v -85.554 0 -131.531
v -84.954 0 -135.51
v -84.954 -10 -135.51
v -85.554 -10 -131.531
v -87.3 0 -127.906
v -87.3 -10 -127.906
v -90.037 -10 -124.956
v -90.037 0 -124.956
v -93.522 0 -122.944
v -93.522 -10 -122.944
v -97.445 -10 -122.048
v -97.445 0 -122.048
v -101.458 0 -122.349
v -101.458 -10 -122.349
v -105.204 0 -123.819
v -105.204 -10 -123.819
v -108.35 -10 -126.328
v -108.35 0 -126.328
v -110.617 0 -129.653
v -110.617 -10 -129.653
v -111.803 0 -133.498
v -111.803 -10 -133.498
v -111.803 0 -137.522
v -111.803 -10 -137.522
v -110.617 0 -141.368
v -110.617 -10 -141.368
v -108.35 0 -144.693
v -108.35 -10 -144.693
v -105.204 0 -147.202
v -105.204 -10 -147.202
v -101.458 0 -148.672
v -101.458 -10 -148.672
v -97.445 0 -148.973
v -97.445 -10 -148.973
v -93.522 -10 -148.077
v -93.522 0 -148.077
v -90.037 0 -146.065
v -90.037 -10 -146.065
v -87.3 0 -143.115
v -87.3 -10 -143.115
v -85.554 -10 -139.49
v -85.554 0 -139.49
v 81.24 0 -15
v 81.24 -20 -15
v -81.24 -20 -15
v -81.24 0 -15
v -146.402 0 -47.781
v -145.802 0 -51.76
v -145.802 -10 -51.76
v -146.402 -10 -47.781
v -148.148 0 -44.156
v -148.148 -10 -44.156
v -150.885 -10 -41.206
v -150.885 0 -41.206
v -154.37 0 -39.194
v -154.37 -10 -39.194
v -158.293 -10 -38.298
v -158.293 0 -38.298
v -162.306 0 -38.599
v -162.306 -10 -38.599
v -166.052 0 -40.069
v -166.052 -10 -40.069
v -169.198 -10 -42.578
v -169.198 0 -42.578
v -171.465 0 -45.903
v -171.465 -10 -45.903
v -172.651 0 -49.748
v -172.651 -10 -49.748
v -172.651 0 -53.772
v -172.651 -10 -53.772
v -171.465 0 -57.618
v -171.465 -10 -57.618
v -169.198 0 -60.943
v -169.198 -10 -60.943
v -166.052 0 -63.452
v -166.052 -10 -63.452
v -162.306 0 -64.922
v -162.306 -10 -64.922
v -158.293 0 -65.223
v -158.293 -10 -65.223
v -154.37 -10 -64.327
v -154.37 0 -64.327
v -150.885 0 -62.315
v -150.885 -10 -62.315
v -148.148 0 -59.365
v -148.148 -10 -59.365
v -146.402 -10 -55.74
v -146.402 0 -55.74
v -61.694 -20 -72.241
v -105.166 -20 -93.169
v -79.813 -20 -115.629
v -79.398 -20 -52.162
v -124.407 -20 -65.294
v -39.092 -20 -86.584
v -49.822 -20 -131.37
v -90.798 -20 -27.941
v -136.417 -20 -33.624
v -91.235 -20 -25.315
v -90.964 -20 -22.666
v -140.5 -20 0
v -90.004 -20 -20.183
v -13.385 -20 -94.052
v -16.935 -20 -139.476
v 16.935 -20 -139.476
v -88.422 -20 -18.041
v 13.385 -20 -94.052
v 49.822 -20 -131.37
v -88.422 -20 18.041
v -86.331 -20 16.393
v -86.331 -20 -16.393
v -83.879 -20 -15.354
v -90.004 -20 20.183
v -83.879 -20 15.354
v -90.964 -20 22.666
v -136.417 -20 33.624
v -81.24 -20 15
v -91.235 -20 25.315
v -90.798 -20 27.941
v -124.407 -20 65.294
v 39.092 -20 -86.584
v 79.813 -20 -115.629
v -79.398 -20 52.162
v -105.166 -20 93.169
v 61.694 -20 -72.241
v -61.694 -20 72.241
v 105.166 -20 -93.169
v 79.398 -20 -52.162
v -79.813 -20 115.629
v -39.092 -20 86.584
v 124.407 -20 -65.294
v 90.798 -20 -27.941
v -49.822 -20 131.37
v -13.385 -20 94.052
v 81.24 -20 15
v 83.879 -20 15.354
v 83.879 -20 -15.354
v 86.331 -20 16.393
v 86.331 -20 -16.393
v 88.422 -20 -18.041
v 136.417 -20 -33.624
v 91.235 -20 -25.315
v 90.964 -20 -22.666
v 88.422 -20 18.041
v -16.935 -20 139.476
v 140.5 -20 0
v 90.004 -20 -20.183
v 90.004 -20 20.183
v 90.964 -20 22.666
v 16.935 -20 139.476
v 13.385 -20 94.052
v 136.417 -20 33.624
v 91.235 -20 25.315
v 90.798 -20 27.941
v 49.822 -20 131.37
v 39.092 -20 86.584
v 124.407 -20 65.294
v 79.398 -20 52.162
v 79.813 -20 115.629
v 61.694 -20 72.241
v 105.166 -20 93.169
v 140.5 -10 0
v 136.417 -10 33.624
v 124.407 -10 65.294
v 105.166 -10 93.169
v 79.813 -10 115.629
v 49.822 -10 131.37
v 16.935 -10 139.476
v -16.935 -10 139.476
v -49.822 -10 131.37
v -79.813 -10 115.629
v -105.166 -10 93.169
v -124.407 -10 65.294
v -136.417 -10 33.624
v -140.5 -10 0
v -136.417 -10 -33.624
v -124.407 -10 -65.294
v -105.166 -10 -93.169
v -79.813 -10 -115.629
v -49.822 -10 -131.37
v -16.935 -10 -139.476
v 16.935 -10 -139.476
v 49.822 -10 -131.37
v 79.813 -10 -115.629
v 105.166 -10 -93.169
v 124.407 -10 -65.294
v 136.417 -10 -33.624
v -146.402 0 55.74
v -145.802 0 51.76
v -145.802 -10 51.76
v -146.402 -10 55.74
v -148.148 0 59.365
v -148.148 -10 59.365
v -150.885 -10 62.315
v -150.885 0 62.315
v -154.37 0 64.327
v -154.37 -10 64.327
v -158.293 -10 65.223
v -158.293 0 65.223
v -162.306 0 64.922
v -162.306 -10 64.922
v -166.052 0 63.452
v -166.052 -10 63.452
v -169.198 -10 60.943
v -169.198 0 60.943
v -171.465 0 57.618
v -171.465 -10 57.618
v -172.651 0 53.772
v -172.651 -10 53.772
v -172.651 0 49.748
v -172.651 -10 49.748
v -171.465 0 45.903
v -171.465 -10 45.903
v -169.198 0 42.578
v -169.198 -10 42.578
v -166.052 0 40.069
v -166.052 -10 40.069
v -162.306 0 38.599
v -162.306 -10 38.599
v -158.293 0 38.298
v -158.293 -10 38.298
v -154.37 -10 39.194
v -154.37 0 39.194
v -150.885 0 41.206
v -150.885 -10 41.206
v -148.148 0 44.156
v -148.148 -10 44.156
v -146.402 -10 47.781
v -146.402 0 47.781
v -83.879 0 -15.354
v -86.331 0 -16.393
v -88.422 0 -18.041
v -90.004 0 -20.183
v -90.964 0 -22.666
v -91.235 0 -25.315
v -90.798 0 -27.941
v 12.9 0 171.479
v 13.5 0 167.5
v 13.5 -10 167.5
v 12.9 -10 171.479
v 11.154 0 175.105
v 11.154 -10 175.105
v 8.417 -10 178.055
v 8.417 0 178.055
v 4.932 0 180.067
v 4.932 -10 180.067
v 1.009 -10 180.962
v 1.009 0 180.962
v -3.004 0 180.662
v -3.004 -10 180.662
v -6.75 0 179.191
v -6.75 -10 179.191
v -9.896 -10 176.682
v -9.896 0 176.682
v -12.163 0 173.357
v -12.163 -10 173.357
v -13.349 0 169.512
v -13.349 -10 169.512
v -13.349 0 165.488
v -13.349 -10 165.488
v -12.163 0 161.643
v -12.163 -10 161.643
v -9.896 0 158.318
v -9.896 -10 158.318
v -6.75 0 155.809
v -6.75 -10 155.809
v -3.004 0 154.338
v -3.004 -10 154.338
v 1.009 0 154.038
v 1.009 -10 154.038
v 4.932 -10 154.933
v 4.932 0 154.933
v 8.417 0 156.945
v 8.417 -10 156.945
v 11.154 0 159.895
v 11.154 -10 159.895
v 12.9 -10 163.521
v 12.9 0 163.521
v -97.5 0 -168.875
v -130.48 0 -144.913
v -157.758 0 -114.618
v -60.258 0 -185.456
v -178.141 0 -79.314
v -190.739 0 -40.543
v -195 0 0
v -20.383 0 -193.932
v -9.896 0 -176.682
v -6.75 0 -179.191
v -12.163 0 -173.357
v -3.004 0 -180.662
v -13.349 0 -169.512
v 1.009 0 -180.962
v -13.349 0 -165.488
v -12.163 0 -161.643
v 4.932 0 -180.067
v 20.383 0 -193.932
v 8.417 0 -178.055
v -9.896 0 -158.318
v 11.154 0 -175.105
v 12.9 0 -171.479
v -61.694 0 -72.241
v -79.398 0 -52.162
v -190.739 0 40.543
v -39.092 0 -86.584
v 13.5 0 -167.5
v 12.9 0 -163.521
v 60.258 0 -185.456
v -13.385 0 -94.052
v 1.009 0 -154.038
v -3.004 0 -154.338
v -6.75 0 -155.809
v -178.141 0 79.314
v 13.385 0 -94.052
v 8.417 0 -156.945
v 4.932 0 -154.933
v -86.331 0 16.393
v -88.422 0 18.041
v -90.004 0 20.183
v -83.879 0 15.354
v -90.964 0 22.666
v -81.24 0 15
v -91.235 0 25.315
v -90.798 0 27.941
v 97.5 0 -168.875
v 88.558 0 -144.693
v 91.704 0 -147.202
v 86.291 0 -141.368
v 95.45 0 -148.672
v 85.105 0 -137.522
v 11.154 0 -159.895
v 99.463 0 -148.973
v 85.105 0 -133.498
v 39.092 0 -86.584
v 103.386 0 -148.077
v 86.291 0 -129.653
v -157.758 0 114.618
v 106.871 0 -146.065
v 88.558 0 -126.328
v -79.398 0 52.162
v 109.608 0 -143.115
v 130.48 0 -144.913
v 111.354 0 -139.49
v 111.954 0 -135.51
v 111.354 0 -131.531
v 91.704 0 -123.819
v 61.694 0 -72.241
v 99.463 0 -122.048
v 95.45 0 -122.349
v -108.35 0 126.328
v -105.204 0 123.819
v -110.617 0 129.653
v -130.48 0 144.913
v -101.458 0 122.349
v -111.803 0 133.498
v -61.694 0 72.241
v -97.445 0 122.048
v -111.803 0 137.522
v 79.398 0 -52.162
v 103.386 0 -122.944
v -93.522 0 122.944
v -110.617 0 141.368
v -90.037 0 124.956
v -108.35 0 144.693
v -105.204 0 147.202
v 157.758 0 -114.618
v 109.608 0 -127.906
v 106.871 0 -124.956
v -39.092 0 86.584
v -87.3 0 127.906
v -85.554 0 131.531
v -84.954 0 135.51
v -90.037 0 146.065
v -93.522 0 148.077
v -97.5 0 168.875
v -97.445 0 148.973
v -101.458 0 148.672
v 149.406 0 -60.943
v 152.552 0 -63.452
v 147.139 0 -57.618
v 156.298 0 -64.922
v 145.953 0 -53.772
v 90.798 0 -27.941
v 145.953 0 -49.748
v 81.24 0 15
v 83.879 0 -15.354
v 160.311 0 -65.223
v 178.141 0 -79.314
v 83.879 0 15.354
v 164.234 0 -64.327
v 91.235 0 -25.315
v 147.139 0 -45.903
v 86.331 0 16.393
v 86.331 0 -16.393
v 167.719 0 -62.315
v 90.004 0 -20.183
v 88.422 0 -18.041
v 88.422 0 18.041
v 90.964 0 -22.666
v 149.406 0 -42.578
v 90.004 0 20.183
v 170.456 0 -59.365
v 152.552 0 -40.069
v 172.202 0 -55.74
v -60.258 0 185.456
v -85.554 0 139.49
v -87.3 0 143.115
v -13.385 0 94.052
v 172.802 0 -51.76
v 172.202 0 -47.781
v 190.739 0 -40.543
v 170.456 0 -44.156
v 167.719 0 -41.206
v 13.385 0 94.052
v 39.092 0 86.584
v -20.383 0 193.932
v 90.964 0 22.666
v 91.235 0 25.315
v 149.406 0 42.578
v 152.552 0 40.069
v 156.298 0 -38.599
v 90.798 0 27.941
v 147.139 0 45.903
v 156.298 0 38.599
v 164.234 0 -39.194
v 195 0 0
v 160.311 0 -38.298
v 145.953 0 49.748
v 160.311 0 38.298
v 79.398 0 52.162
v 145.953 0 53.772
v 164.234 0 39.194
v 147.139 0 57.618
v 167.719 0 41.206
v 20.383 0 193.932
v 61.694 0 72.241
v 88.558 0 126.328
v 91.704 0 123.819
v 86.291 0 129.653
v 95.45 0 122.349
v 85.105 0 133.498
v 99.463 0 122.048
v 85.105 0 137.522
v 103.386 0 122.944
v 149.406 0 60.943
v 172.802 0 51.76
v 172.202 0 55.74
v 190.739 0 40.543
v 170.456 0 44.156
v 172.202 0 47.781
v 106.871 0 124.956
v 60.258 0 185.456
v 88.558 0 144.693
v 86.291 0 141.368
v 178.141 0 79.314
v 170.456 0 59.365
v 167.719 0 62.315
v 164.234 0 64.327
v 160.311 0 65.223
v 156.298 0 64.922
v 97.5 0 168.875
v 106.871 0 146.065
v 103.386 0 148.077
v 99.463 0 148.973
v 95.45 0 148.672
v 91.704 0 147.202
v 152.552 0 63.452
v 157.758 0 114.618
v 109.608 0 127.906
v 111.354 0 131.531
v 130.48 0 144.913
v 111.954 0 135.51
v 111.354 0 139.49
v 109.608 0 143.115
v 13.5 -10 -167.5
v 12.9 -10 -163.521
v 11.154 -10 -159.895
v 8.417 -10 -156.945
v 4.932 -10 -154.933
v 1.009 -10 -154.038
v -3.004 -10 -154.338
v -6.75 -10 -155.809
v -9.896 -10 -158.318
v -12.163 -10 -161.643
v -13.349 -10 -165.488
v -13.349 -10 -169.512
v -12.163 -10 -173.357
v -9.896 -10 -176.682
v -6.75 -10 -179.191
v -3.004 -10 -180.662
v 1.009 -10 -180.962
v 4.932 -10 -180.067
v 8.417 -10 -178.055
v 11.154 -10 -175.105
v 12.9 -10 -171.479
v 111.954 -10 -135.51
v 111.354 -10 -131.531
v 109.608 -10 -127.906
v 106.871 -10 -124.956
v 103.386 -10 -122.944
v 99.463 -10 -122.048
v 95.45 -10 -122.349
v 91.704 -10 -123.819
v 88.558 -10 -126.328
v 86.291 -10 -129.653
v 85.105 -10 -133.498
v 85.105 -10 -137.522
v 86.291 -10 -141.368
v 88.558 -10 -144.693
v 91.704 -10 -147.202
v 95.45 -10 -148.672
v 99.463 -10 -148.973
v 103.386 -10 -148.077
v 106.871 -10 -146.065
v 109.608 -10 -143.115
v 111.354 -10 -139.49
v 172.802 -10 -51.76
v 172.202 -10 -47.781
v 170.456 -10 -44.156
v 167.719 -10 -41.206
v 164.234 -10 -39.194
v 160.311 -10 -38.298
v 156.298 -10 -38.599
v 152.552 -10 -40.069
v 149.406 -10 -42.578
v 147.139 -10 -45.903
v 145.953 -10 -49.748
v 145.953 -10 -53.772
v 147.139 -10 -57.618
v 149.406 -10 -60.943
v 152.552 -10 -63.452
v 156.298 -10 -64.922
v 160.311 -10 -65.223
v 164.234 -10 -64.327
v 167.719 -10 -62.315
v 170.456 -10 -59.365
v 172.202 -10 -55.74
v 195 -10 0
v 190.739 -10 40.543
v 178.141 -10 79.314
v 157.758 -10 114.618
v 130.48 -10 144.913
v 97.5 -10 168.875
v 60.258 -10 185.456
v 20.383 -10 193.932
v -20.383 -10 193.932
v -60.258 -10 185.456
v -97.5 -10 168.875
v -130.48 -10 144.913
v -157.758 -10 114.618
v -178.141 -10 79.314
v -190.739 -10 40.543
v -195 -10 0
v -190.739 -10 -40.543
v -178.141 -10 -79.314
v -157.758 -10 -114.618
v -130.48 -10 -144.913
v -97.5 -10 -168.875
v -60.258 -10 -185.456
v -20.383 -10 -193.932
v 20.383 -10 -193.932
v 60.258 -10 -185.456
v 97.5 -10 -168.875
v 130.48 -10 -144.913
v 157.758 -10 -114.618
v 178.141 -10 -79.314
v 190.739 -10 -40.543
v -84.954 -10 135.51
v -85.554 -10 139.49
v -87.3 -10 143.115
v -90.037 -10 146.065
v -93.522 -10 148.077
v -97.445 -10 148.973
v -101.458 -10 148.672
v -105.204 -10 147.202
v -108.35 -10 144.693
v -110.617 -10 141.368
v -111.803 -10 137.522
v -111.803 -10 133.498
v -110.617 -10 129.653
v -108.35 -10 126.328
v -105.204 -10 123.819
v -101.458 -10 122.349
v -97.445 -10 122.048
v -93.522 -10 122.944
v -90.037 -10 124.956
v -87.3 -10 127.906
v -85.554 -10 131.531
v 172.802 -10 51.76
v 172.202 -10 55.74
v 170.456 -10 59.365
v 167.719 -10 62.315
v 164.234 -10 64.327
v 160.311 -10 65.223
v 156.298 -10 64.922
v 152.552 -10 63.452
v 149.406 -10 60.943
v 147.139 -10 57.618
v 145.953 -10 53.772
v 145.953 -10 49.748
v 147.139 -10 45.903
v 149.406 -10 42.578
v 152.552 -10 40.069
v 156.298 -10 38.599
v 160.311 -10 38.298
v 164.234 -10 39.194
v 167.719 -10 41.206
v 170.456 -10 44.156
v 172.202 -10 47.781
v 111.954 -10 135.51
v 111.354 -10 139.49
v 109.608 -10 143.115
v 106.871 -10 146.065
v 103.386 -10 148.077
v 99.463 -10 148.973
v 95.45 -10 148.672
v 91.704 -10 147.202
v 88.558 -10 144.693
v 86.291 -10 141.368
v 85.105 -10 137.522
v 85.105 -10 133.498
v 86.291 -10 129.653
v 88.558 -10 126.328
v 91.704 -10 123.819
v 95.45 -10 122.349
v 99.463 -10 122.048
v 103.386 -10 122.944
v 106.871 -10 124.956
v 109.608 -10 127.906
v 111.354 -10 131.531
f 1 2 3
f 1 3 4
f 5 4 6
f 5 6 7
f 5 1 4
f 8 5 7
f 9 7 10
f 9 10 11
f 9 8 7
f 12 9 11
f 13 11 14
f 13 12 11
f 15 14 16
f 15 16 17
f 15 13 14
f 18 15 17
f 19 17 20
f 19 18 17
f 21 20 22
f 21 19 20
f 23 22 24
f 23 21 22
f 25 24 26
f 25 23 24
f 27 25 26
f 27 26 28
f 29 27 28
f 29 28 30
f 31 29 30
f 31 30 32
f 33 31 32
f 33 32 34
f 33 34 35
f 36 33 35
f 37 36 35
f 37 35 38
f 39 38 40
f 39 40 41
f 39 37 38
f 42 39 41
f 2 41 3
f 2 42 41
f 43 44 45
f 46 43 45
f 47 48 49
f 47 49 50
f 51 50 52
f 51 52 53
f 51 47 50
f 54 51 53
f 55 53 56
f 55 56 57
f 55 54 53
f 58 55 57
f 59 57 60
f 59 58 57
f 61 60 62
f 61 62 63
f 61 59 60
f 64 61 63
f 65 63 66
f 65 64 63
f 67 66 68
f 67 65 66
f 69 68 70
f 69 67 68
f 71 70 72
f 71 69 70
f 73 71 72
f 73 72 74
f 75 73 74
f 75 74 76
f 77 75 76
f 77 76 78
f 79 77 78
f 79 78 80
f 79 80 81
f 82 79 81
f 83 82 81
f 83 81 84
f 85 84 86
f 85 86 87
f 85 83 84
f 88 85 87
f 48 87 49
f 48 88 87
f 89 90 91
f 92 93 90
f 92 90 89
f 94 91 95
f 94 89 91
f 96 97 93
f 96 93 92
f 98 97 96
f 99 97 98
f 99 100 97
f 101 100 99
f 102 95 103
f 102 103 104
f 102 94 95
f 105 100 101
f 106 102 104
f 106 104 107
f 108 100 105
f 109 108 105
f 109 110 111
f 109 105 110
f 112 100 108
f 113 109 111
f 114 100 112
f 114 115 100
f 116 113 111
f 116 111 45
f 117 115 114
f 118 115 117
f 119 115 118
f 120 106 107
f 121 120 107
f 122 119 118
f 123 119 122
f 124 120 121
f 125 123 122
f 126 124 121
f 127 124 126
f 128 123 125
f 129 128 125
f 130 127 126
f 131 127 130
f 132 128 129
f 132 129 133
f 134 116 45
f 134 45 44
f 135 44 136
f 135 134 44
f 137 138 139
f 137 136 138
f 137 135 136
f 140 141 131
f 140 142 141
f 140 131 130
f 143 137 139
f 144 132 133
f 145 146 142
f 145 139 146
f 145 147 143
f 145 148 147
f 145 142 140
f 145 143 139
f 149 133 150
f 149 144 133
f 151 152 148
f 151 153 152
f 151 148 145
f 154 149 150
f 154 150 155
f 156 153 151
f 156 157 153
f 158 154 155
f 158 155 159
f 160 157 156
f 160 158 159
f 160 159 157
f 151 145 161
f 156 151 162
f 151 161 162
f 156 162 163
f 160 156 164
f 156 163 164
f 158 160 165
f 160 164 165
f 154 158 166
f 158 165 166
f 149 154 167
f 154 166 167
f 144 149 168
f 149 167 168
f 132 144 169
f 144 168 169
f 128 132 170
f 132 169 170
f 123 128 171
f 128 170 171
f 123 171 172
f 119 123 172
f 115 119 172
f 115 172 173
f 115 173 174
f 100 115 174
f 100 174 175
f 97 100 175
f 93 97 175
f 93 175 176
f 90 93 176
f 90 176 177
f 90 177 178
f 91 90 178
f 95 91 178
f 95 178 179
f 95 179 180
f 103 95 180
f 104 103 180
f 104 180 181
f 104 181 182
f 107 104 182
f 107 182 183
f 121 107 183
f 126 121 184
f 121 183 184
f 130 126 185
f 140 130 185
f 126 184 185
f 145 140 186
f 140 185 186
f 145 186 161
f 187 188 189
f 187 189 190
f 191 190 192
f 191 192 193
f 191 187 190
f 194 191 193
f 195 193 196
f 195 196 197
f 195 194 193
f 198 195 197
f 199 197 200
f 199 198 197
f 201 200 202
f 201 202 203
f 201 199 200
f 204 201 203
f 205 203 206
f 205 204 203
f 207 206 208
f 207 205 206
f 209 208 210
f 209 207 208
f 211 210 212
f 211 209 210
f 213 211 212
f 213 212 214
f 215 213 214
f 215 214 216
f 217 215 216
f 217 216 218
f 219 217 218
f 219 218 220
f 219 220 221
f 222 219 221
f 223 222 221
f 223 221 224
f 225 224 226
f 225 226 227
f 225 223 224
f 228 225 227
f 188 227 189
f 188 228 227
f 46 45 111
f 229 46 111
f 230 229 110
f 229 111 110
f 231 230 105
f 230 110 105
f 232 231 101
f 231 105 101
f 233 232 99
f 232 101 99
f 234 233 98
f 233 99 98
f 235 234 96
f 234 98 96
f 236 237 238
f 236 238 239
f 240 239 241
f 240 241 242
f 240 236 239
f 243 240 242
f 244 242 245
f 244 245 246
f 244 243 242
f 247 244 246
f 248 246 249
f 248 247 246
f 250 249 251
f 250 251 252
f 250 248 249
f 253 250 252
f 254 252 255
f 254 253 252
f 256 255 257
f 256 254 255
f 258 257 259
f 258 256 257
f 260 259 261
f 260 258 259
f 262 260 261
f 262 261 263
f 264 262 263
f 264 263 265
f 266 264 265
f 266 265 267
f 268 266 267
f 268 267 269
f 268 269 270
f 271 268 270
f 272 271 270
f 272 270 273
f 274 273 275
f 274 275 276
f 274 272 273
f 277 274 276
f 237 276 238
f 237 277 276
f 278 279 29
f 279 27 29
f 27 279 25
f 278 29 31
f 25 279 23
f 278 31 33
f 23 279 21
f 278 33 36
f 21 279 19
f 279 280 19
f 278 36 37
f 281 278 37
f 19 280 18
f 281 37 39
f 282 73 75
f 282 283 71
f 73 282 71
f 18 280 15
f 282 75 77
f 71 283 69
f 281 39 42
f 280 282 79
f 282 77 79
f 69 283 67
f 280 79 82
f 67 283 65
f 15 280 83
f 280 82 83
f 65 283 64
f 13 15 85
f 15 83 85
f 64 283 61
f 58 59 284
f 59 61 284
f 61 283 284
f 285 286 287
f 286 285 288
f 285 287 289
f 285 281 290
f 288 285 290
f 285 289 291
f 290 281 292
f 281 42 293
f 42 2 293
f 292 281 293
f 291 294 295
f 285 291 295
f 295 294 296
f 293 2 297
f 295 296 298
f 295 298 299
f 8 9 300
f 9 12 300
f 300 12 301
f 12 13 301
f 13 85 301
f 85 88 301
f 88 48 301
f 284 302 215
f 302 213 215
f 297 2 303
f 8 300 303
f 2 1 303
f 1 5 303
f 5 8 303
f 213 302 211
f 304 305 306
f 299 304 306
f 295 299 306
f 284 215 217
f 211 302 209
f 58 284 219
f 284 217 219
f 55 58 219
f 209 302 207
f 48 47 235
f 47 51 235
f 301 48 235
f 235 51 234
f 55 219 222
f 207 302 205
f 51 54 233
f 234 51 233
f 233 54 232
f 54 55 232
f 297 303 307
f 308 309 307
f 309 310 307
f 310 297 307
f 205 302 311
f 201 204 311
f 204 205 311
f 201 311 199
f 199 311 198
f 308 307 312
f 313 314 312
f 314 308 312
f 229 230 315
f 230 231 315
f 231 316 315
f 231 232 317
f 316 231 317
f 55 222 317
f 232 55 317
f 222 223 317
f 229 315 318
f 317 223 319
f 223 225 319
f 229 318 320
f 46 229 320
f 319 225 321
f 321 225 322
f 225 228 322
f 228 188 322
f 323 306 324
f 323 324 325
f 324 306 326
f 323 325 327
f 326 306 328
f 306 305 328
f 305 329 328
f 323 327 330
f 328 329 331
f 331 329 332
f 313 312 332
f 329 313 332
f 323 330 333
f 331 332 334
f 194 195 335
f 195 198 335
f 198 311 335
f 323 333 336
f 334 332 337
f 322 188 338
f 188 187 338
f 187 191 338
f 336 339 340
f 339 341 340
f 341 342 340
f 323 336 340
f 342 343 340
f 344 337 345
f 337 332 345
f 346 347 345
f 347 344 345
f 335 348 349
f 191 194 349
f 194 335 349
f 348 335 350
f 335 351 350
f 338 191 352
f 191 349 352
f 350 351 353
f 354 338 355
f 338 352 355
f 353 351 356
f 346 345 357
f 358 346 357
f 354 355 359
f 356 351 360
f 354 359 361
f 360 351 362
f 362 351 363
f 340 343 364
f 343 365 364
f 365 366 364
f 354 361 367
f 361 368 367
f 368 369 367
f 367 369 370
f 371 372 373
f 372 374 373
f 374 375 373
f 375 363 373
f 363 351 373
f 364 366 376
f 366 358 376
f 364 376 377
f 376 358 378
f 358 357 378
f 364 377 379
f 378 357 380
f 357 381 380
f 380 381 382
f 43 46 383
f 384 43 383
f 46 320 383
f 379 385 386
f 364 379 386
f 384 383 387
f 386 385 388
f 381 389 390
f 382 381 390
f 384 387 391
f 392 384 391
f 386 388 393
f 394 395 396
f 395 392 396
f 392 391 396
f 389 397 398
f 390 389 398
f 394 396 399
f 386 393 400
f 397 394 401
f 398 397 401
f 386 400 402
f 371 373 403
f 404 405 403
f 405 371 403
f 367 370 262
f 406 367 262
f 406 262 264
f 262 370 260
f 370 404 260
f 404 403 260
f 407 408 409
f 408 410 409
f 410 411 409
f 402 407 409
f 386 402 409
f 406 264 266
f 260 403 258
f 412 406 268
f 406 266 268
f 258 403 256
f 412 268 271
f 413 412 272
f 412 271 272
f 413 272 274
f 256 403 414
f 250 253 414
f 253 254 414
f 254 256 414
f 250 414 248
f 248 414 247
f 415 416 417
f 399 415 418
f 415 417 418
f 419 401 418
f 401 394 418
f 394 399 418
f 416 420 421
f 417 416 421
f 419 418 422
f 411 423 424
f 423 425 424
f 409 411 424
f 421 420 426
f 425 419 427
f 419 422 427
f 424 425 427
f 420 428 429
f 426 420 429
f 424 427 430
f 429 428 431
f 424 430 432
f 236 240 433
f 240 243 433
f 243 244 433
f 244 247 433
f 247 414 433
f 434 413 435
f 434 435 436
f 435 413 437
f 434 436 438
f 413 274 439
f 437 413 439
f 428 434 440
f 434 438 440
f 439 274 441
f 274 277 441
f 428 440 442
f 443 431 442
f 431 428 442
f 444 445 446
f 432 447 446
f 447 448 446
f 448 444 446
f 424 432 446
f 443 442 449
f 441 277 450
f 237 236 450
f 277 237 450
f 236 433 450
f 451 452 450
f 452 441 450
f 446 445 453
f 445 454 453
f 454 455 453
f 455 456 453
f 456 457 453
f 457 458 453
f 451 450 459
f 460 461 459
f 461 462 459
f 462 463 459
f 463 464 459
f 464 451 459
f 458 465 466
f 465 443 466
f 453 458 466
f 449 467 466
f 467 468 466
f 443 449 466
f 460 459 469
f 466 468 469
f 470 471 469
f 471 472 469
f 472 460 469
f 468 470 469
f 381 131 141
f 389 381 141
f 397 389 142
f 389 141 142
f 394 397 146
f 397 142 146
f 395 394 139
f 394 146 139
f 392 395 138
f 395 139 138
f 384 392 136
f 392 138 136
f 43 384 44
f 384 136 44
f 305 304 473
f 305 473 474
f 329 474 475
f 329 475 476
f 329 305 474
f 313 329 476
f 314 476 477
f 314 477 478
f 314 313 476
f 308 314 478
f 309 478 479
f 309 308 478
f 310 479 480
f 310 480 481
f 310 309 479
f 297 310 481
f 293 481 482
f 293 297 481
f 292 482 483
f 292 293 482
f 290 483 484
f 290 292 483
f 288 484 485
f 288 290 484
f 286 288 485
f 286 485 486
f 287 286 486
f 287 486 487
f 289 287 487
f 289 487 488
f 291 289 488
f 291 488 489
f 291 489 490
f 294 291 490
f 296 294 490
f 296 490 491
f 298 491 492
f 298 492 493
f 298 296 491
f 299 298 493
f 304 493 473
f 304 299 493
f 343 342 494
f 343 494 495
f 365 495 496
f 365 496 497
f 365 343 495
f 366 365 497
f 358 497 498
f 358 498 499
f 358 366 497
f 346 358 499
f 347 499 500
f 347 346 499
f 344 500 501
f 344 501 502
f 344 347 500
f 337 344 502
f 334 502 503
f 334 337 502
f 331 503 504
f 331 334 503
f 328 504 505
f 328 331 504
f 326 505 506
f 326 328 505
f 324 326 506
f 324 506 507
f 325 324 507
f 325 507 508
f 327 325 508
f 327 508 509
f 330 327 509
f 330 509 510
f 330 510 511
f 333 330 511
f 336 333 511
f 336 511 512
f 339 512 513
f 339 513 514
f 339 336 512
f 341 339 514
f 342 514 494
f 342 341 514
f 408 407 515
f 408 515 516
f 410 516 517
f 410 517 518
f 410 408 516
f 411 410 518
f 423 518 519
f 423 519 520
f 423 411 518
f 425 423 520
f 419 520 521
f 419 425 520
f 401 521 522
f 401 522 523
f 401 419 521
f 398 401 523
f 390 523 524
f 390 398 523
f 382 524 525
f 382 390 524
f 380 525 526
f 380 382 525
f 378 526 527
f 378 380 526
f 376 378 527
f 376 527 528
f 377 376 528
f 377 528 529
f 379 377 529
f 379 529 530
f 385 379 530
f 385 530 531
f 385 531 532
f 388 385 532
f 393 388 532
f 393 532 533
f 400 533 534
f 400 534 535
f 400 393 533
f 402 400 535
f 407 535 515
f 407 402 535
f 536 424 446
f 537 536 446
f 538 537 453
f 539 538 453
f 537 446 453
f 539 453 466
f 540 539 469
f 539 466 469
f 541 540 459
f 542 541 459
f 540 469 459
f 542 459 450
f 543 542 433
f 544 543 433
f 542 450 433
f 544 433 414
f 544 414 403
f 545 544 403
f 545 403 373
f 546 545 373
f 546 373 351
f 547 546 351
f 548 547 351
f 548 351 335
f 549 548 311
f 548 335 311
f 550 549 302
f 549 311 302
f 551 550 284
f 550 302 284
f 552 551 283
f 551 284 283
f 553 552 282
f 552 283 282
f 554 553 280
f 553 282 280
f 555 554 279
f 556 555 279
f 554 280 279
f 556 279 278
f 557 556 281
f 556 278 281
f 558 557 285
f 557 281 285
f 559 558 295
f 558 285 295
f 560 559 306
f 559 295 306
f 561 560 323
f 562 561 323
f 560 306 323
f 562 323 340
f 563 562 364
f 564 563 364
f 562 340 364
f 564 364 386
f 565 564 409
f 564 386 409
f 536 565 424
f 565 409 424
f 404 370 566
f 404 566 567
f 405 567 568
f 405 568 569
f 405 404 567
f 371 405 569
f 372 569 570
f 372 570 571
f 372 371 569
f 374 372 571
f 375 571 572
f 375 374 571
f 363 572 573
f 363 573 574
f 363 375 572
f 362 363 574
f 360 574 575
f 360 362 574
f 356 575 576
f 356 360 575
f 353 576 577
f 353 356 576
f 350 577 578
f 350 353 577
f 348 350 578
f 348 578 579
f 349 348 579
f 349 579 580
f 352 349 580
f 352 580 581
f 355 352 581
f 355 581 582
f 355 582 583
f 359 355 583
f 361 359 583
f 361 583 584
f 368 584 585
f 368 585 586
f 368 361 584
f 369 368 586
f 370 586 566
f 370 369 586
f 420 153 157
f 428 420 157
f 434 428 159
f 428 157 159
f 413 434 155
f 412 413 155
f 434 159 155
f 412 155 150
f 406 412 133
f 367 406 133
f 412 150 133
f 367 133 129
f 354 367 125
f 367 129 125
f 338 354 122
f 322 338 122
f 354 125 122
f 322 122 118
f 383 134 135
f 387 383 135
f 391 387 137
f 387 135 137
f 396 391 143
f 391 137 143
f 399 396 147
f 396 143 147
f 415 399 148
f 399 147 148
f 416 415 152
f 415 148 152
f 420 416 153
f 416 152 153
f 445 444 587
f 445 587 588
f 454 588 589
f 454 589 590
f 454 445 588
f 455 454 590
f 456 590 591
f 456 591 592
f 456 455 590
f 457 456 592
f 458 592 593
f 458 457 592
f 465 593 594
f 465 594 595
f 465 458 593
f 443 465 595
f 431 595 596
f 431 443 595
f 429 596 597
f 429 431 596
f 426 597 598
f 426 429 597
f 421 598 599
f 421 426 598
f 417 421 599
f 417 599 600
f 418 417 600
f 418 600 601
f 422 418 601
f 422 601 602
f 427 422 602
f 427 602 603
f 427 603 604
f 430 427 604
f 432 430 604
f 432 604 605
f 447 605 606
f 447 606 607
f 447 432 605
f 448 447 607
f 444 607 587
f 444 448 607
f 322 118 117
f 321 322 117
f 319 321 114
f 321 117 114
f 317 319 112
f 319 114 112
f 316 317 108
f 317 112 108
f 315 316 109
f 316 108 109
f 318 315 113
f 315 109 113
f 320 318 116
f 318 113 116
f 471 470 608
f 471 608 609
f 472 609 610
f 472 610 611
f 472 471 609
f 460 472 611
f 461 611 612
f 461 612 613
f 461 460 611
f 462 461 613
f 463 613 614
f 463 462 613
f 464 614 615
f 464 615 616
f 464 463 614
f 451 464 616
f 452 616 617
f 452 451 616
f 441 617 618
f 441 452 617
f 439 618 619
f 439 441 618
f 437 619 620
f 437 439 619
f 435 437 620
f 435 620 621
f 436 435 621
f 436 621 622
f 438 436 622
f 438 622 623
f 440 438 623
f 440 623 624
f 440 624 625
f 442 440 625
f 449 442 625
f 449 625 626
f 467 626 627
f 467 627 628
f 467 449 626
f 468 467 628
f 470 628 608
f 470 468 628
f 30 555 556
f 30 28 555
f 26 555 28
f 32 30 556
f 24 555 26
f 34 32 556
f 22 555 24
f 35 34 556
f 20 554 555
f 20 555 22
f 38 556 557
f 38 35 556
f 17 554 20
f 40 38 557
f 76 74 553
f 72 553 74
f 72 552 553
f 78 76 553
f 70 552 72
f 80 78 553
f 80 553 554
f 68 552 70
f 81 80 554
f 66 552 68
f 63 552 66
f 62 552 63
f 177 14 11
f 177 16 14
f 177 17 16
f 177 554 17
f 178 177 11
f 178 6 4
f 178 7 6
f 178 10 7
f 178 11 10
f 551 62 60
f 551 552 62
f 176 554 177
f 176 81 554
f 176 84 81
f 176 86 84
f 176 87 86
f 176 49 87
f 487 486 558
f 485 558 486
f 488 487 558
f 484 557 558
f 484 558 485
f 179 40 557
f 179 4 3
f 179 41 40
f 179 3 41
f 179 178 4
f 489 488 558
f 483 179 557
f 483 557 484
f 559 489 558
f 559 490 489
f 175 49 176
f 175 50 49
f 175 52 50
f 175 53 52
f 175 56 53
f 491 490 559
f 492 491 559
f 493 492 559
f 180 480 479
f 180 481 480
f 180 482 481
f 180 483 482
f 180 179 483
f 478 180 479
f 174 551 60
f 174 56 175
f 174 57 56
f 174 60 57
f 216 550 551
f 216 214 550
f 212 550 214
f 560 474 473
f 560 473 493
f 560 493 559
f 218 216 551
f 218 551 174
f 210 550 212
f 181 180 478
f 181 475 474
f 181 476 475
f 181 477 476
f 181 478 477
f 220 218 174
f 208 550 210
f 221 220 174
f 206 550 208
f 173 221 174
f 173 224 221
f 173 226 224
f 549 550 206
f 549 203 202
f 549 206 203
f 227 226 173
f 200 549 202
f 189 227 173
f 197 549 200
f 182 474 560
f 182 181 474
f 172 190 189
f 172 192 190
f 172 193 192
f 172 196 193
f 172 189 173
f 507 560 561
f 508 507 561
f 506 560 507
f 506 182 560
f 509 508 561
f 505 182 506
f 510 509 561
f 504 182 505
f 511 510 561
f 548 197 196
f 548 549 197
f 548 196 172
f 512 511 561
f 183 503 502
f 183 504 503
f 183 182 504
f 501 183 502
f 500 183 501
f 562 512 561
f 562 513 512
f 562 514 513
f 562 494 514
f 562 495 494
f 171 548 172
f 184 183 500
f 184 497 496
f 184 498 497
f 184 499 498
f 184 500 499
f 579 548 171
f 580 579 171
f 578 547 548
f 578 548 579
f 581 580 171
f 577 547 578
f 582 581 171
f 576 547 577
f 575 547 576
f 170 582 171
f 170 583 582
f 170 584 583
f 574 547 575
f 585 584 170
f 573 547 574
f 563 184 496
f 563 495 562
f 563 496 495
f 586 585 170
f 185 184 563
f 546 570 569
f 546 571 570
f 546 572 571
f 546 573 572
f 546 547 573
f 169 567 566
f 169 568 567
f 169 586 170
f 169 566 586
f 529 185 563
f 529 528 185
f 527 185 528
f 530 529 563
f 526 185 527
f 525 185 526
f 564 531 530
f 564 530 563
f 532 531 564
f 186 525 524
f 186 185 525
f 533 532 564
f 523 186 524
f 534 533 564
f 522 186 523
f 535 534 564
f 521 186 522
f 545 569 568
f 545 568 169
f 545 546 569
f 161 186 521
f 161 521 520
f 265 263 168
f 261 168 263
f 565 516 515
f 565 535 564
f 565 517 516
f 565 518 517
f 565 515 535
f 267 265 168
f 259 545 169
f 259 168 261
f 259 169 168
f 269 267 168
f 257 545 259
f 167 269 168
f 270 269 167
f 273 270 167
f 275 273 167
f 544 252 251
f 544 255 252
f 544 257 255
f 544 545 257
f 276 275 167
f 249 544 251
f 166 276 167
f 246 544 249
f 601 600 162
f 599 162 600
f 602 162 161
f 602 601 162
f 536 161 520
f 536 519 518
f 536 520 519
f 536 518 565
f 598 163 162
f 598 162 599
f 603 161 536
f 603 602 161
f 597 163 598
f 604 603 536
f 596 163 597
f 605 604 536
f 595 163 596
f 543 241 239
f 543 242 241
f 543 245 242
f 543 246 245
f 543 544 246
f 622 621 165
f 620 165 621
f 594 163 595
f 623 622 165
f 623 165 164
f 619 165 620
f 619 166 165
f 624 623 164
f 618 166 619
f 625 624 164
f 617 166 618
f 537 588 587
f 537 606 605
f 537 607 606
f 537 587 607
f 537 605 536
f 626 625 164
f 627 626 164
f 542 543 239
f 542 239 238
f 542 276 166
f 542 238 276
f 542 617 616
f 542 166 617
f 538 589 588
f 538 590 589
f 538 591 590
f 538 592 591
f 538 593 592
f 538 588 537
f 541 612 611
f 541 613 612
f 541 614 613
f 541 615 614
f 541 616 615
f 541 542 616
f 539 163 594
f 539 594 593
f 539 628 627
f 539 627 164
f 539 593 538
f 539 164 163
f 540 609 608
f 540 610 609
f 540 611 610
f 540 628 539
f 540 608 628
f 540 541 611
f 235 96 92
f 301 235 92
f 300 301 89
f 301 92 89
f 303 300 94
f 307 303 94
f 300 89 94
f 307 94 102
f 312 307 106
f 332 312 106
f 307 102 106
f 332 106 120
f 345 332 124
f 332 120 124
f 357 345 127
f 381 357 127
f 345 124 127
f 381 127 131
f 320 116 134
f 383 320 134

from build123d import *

# Parameters (mm, degrees)
F0_R     = 140.5
F1_DEPTH = 20
F0_R_2   = 195
F0_R_3   = 13.5
F2_DEPTH = 10
F4_DEPTH = 25


with BuildPart() as f1:
    # F0 (on Front) → F1 (new body)
    with BuildSketch(Plane.XZ):
        Circle(F0_R)
    extrude(amount=F1_DEPTH)

    # F0 (on Front) → F2 (join)
    with BuildSketch(Plane.XZ):
        Circle(F0_R_2)
        with Locations((-98.45403, -135.510347)):
            Circle(F0_R_3, mode=Mode.SUBTRACT)
        with Locations((-159.301966, -51.760347)):
            Circle(F0_R_3, mode=Mode.SUBTRACT)
        with Locations((0, -167.5)):
            Circle(F0_R_3, mode=Mode.SUBTRACT)
        with Locations((98.45403, -135.510347)):
            Circle(F0_R_3, mode=Mode.SUBTRACT)
        with Locations((159.301966, -51.760347)):
            Circle(F0_R_3, mode=Mode.SUBTRACT)
        with Locations((-159.301966, 51.760347)):
            Circle(F0_R_3, mode=Mode.SUBTRACT)
        with Locations((-98.45403, 135.510347)):
            Circle(F0_R_3, mode=Mode.SUBTRACT)
        Circle(F0_R, mode=Mode.SUBTRACT)
        with Locations((159.301966, 51.760347)):
            Circle(F0_R_3, mode=Mode.SUBTRACT)
        with Locations((0, 167.5)):
            Circle(F0_R_3, mode=Mode.SUBTRACT)
        with Locations((98.45403, 135.510347)):
            Circle(F0_R_3, mode=Mode.SUBTRACT)
    extrude(amount=F2_DEPTH)

    # F3 (on face) → F4 (cut)
    with BuildSketch(Plane.XZ.offset(20)):
        with BuildLine():
            ThreePointArc((81.240384, 15), (89.284381, 19.059115), (90.798076, 27.941176))
            ThreePointArc((90.798076, 27.941176), (0, 95), (-90.798076, 27.941176))
            ThreePointArc((-90.798076, 27.941176), (-89.284381, 19.059115), (-81.240384, 15))
            Line((-81.240384, 15), (81.240384, 15))
        make_face()
        with BuildLine():
            Line((81.240384, -15), (-81.240384, -15))
            ThreePointArc((-81.240384, -15), (-89.284381, -19.059115), (-90.798076, -27.941176))
            ThreePointArc((-90.798076, -27.941176), (0, -95), (90.798076, -27.941176))
            ThreePointArc((90.798076, -27.941176), (89.284381, -19.059115), (81.240384, -15))
        make_face()
    extrude(amount=-F4_DEPTH, mode=Mode.SUBTRACT)


solid = f1.part
